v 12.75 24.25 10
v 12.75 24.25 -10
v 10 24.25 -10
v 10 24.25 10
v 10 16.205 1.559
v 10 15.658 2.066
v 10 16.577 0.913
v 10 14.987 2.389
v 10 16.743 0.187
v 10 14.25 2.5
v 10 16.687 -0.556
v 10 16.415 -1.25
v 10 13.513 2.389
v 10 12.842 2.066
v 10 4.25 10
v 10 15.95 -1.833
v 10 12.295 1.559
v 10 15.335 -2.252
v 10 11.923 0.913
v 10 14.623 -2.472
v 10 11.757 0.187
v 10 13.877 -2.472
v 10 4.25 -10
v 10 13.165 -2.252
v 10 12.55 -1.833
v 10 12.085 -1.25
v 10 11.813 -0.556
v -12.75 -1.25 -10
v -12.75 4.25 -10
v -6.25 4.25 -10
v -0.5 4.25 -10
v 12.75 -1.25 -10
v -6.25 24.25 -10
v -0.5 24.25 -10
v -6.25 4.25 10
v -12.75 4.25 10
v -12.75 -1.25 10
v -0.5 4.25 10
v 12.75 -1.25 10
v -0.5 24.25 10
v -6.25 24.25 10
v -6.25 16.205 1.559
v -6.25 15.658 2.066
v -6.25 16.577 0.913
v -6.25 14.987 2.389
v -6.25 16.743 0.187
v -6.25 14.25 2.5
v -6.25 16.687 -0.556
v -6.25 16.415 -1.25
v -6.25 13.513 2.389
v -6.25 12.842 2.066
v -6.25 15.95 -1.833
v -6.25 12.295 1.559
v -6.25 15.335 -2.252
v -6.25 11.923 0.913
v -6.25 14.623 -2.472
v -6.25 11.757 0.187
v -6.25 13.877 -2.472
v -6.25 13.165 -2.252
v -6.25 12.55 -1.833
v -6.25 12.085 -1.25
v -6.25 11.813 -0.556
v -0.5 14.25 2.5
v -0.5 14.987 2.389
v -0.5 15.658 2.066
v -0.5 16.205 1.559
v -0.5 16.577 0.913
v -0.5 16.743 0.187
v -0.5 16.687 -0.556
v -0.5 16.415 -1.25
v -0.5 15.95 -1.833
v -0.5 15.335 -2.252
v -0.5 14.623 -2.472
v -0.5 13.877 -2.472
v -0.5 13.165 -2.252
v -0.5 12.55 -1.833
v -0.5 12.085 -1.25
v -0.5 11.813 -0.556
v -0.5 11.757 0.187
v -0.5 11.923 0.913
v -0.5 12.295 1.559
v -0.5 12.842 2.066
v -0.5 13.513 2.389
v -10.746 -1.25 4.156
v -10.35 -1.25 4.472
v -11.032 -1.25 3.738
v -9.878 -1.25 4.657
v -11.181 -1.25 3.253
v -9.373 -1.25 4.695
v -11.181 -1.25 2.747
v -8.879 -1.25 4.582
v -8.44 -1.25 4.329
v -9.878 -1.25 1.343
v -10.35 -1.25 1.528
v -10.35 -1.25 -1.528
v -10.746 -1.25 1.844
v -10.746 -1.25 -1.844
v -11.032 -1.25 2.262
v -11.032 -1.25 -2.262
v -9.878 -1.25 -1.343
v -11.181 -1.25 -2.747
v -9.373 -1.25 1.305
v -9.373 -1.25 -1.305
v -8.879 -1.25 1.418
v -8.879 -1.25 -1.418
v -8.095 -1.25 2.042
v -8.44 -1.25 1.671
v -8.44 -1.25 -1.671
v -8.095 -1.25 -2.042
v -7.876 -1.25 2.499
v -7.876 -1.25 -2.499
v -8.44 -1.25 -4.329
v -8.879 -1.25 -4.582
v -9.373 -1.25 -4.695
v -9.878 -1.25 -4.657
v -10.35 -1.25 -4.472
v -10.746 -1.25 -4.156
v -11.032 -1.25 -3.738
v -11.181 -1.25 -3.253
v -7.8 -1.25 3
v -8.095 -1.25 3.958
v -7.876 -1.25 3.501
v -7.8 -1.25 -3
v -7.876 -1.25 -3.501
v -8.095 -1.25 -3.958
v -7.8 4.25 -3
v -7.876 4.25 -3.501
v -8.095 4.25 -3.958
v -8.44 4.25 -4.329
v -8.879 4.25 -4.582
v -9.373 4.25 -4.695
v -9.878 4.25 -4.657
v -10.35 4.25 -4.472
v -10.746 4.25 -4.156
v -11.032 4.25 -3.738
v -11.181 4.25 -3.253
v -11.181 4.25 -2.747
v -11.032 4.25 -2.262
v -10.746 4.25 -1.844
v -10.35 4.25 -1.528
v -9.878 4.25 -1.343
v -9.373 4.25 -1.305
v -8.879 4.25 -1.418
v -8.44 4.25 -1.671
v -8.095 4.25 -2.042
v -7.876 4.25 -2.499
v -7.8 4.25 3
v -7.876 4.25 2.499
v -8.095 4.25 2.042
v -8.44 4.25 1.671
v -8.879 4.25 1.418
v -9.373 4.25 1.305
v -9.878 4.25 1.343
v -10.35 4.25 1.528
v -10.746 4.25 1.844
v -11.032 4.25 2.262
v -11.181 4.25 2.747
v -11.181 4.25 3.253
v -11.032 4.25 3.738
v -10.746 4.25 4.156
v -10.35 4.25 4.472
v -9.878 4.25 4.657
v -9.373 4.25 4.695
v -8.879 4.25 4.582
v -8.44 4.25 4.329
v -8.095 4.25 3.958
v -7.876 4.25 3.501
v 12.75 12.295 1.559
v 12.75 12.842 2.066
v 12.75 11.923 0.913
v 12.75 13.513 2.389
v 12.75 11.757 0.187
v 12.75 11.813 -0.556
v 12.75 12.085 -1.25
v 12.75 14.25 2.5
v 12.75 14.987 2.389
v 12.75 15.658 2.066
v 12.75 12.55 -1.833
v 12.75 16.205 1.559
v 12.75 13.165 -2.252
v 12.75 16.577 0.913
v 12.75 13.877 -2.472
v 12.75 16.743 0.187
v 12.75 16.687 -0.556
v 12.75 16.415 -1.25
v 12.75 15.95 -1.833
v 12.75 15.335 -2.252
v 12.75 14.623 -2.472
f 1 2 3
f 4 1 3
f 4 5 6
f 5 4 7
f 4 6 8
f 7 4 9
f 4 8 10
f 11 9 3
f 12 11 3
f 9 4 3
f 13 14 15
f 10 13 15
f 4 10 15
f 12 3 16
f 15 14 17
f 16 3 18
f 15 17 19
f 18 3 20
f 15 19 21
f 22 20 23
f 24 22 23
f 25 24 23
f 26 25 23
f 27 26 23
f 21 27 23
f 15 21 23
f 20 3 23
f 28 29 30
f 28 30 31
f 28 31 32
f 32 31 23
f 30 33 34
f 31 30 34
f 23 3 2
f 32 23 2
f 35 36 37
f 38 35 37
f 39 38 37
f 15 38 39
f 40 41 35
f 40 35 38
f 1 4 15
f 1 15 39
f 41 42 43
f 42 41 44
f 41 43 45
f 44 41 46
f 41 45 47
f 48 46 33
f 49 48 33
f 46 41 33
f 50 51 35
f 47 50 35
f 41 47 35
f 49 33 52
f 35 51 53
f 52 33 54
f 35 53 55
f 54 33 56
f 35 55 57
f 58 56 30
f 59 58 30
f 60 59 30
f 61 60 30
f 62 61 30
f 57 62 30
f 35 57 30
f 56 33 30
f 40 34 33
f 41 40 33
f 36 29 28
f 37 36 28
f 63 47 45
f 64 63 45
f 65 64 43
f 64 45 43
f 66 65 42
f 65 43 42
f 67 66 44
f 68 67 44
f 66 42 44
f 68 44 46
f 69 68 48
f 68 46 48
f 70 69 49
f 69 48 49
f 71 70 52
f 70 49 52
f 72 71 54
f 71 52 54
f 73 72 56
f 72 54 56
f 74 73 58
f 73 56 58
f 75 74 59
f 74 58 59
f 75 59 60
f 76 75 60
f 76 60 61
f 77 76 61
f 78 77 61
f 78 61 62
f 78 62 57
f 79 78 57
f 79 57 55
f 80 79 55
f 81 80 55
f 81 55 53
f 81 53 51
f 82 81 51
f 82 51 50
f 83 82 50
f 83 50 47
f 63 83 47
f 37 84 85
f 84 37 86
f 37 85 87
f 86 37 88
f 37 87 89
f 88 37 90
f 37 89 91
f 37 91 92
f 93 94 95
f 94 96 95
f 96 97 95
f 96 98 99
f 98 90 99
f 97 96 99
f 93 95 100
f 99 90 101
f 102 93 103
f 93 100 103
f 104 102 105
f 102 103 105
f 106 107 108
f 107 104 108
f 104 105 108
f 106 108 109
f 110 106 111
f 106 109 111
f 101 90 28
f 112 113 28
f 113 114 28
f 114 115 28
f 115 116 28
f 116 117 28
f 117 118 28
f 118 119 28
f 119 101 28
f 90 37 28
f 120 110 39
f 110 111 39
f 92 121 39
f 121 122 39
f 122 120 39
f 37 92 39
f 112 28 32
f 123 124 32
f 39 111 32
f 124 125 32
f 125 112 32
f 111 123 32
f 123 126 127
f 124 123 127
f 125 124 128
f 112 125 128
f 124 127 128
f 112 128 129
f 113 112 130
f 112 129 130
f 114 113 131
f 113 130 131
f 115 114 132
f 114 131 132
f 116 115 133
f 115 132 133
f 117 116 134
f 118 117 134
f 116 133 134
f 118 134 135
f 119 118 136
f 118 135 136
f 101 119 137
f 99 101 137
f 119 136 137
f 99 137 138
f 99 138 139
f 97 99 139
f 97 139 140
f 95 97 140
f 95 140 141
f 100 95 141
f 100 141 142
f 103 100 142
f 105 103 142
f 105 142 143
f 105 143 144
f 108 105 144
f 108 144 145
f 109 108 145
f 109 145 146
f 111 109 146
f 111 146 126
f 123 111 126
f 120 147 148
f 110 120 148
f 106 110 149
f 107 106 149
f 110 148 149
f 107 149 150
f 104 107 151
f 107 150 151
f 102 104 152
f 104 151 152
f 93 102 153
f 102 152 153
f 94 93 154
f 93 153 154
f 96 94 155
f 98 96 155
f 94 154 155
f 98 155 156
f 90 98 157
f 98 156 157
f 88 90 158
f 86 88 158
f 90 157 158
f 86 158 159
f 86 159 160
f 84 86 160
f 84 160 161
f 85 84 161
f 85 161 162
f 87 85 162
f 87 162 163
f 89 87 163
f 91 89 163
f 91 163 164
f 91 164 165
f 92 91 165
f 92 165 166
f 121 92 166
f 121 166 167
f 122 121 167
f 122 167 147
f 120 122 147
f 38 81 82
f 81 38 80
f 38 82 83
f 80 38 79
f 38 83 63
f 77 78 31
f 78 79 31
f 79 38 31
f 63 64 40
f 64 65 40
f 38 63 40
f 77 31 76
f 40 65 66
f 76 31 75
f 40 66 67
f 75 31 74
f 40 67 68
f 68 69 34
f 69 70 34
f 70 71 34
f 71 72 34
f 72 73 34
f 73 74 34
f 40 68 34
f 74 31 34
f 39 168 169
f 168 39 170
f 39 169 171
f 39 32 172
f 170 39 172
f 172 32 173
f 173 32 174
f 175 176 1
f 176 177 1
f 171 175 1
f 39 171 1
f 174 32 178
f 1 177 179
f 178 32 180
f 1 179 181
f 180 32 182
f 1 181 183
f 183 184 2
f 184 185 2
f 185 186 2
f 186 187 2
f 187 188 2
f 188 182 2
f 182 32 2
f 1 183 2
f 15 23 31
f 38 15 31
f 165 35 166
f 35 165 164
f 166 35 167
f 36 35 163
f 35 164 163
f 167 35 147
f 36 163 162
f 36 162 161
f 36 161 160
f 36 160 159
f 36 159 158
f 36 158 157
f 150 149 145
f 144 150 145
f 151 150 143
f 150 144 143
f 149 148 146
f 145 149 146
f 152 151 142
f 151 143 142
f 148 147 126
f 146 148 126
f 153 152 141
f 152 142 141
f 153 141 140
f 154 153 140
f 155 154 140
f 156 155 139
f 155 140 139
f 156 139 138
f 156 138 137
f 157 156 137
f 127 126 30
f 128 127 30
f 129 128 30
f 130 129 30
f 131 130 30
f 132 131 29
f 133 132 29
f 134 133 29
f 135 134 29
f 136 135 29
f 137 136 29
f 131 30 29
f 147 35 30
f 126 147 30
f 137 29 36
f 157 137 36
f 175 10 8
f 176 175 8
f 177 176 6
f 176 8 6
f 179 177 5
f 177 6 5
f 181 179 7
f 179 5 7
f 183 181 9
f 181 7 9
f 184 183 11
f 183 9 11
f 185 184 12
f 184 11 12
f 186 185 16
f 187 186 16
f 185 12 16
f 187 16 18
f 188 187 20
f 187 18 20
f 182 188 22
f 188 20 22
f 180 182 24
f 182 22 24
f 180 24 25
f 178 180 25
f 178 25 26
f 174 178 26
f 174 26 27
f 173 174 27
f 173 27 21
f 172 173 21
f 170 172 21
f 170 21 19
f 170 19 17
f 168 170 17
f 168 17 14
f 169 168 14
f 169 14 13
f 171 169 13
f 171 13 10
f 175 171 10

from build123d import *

# Parameters (mm, degrees)
BODY_START           = -10
BODY_DEPTH           = 20
M3_CLEARANCE_HOLE1_D = 3.4
CUT_EXTRUDE1_REACH   = 34.389
SKETCH4_R            = 2.5


# Read off the part's stored shape, not the designer's step: Body
with BuildPart() as part:
    # Body outline → Body (new body)
    with BuildSketch(Plane.XY.offset(BODY_START)):
        Polygon((10, 24.25), (10, 4.25), (-0.5, 4.25), (-0.5, 24.25), (-6.25, 24.25), (-6.25, 4.25), (-12.75, 4.25), (-12.75, -1.25), (12.75, -1.25), (12.75, 24.25), align=None)
    extrude(amount=BODY_DEPTH)

    # M3 Clearance Hole1 (through all)
    with Locations(Plane(origin=(0, -1.25, 0), x_dir=(-1, 0, 0), z_dir=(0, -1, 0))):
        with Locations((9.5, -3), (9.5, 3)):
            Hole(M3_CLEARANCE_HOLE1_D / 2)

    # Cut-Extrude1: up to this face of the body (flat: up to its plane)
    cut_extrude1_end = Plane(part.part.faces().sort_by_distance((12.75, 11.5, 0))[0])
    # Sketch4 → Cut-Extrude1 (cut, up to the picked face)
    with BuildSketch(Plane.ZY.offset(6.25), mode=Mode.PRIVATE) as cut_extrude1_sk1:
        with Locations((0, 14.25)):
            Circle(SKETCH4_R)
    cut_extrude1_tool1 = split(extrude(cut_extrude1_sk1.sketch, amount=-CUT_EXTRUDE1_REACH, mode=Mode.PRIVATE), bisect_by=cut_extrude1_end, keep=Keep.BOTH, mode=Mode.PRIVATE)
    add(cut_extrude1_tool1.solids().sort_by(Axis((-6.25, 14.25, 0), (1, 0, 0)))[0], mode=Mode.SUBTRACT)


solid = part.part
